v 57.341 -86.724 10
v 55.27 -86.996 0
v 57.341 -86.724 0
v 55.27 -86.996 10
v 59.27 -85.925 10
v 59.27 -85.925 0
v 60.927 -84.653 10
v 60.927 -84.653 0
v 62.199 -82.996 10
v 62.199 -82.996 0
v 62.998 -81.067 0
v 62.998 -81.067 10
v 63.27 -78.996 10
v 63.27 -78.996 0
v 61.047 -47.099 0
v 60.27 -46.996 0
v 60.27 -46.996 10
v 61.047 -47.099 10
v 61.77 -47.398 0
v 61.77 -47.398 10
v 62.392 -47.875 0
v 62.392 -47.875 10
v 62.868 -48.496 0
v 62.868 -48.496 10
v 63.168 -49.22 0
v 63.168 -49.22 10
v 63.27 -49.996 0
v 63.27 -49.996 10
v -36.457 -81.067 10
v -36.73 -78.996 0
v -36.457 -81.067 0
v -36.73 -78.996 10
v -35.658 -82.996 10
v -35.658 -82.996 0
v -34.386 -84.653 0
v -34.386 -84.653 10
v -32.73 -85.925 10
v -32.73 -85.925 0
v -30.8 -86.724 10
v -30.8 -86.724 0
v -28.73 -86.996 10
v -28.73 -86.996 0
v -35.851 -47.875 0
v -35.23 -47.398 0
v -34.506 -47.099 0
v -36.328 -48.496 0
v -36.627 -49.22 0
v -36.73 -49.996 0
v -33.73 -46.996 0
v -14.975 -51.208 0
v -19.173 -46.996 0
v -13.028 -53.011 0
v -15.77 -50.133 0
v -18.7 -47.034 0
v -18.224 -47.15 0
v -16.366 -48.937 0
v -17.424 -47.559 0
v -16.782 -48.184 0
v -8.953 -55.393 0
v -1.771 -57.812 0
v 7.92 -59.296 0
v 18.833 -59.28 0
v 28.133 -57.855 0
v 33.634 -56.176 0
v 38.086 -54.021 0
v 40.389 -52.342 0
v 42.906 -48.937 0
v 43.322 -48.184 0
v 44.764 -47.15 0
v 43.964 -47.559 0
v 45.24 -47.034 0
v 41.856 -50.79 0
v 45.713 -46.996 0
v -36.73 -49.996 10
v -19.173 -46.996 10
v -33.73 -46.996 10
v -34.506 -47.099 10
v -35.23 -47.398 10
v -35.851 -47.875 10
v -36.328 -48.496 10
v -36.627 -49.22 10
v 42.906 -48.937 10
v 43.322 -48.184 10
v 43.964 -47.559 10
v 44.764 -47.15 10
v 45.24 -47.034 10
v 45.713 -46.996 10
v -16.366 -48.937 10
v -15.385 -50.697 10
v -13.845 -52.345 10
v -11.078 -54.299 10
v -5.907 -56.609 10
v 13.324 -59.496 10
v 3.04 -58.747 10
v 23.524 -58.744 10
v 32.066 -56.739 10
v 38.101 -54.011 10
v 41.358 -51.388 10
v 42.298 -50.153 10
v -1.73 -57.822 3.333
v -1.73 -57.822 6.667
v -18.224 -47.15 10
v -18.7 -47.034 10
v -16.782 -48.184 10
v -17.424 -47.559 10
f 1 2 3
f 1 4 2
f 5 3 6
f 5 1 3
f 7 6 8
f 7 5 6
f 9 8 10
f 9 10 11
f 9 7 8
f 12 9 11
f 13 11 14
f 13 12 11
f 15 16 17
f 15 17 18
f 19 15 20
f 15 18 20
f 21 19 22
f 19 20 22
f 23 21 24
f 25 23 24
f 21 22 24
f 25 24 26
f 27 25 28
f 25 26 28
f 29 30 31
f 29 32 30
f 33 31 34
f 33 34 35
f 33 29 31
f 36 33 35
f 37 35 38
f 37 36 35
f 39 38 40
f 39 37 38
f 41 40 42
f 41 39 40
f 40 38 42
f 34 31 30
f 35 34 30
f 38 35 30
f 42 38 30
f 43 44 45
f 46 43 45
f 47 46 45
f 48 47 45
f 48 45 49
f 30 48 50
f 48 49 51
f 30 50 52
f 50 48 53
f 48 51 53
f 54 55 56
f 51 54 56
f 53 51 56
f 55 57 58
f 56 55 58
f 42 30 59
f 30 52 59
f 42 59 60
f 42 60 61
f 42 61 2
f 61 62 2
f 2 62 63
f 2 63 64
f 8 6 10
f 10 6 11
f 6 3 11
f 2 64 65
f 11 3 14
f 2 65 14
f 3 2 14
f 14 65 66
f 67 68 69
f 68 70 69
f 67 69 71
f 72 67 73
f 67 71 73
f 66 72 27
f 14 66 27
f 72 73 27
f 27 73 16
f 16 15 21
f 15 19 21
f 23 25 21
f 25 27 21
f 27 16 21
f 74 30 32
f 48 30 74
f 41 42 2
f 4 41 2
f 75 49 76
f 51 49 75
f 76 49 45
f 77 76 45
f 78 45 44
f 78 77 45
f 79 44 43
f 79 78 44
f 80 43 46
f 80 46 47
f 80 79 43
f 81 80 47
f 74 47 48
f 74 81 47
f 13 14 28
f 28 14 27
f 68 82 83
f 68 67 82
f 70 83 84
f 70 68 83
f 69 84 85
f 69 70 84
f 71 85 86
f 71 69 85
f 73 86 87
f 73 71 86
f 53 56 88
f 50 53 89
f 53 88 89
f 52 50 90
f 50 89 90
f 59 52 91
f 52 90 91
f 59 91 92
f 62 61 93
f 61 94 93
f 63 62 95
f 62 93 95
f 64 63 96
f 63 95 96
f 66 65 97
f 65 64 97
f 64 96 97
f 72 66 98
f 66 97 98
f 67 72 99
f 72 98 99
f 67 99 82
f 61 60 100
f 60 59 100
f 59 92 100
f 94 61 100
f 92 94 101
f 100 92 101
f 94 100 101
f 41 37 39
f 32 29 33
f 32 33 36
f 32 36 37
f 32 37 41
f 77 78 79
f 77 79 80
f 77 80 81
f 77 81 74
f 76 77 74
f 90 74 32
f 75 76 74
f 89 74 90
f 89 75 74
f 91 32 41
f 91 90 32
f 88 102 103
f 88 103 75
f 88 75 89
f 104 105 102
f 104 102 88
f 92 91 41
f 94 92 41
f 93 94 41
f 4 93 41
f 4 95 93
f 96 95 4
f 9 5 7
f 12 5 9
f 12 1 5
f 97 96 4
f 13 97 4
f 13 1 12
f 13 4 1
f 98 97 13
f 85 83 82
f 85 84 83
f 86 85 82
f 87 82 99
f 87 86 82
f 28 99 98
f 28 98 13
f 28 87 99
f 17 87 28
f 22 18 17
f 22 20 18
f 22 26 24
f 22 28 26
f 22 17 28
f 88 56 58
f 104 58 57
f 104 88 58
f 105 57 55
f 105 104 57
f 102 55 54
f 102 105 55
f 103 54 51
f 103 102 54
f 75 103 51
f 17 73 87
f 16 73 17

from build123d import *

# Parameters (mm, degrees)
F0_W     = 100
F0_H     = 40
F1_DEPTH = 10
F3_DEPTH = 10.001
F4_R     = 8
F5_R     = 3


with BuildPart() as f1:
    # F0 (on Top) → F1 (new body)
    with BuildSketch(Plane.XY):
        with Locations((13.2704079151, -66.9964028705)):
            Rectangle(F0_W, F0_H)
    extrude(amount=F1_DEPTH)

    # F2 (on face) → F3 (cut, through all)
    with BuildSketch(Plane.XY.offset(10)):
        with BuildLine():
            add(Edge.make_bspline(
                [(43.2704079151, -46.9964028705), (43.2704079151, -25.3457677759), (-1.7295920849, -36.1710853232), (-46.7295920849, -46.9964028705), (-1.7295920849, -57.8217204178), (43.2704079151, -68.6470379651), (43.2704079151, -46.9964028705)],
                knots=[0, 0, 0, 2.0943951024, 2.0943951024, 4.1887902048, 4.1887902048, 6.2831853072, 6.2831853072, 6.2831853072], degree=2, weights=[1, 0.5, 1, 0.5, 1, 0.5, 1]))
        make_face()
    extrude(amount=-F3_DEPTH, mode=Mode.SUBTRACT)

    # F4
    f4_edges = [f1.edges().sort_by_distance(p)[0] for p in [
        (-36.729592, -86.996403, 5),
        (63.270408, -86.996403, 5),
    ]]
    fillet(f4_edges, radius=F4_R)

    # F5 (call 1 of 4: OpenCascade refuses the feature's edges together)
    f5_edges = [f1.edges().sort_by_distance(p)[0] for p in [
        (63.270408, -46.996403, 5),
    ]]
    fillet(f5_edges, radius=F5_R)

    # F5#3 (call 2 of 4)
    f5_3_edges = [f1.edges().sort_by_distance(p)[0] for p in [
        (-16.729592, -46.996403, 5),
    ]]
    fillet(f5_3_edges, radius=F5_R)

    # F5#4 (call 3 of 4)
    f5_4_edges = [f1.edges().sort_by_distance(p)[0] for p in [
        (-36.729592, -46.996403, 5),
    ]]
    fillet(f5_4_edges, radius=F5_R)

    # F5#2 (call 4 of 4)
    f5_2_edges = [f1.edges().sort_by_distance(p)[0] for p in [
        (43.270408, -46.996403, 5),
    ]]
    fillet(f5_2_edges, radius=F5_R)


solid = f1.part
